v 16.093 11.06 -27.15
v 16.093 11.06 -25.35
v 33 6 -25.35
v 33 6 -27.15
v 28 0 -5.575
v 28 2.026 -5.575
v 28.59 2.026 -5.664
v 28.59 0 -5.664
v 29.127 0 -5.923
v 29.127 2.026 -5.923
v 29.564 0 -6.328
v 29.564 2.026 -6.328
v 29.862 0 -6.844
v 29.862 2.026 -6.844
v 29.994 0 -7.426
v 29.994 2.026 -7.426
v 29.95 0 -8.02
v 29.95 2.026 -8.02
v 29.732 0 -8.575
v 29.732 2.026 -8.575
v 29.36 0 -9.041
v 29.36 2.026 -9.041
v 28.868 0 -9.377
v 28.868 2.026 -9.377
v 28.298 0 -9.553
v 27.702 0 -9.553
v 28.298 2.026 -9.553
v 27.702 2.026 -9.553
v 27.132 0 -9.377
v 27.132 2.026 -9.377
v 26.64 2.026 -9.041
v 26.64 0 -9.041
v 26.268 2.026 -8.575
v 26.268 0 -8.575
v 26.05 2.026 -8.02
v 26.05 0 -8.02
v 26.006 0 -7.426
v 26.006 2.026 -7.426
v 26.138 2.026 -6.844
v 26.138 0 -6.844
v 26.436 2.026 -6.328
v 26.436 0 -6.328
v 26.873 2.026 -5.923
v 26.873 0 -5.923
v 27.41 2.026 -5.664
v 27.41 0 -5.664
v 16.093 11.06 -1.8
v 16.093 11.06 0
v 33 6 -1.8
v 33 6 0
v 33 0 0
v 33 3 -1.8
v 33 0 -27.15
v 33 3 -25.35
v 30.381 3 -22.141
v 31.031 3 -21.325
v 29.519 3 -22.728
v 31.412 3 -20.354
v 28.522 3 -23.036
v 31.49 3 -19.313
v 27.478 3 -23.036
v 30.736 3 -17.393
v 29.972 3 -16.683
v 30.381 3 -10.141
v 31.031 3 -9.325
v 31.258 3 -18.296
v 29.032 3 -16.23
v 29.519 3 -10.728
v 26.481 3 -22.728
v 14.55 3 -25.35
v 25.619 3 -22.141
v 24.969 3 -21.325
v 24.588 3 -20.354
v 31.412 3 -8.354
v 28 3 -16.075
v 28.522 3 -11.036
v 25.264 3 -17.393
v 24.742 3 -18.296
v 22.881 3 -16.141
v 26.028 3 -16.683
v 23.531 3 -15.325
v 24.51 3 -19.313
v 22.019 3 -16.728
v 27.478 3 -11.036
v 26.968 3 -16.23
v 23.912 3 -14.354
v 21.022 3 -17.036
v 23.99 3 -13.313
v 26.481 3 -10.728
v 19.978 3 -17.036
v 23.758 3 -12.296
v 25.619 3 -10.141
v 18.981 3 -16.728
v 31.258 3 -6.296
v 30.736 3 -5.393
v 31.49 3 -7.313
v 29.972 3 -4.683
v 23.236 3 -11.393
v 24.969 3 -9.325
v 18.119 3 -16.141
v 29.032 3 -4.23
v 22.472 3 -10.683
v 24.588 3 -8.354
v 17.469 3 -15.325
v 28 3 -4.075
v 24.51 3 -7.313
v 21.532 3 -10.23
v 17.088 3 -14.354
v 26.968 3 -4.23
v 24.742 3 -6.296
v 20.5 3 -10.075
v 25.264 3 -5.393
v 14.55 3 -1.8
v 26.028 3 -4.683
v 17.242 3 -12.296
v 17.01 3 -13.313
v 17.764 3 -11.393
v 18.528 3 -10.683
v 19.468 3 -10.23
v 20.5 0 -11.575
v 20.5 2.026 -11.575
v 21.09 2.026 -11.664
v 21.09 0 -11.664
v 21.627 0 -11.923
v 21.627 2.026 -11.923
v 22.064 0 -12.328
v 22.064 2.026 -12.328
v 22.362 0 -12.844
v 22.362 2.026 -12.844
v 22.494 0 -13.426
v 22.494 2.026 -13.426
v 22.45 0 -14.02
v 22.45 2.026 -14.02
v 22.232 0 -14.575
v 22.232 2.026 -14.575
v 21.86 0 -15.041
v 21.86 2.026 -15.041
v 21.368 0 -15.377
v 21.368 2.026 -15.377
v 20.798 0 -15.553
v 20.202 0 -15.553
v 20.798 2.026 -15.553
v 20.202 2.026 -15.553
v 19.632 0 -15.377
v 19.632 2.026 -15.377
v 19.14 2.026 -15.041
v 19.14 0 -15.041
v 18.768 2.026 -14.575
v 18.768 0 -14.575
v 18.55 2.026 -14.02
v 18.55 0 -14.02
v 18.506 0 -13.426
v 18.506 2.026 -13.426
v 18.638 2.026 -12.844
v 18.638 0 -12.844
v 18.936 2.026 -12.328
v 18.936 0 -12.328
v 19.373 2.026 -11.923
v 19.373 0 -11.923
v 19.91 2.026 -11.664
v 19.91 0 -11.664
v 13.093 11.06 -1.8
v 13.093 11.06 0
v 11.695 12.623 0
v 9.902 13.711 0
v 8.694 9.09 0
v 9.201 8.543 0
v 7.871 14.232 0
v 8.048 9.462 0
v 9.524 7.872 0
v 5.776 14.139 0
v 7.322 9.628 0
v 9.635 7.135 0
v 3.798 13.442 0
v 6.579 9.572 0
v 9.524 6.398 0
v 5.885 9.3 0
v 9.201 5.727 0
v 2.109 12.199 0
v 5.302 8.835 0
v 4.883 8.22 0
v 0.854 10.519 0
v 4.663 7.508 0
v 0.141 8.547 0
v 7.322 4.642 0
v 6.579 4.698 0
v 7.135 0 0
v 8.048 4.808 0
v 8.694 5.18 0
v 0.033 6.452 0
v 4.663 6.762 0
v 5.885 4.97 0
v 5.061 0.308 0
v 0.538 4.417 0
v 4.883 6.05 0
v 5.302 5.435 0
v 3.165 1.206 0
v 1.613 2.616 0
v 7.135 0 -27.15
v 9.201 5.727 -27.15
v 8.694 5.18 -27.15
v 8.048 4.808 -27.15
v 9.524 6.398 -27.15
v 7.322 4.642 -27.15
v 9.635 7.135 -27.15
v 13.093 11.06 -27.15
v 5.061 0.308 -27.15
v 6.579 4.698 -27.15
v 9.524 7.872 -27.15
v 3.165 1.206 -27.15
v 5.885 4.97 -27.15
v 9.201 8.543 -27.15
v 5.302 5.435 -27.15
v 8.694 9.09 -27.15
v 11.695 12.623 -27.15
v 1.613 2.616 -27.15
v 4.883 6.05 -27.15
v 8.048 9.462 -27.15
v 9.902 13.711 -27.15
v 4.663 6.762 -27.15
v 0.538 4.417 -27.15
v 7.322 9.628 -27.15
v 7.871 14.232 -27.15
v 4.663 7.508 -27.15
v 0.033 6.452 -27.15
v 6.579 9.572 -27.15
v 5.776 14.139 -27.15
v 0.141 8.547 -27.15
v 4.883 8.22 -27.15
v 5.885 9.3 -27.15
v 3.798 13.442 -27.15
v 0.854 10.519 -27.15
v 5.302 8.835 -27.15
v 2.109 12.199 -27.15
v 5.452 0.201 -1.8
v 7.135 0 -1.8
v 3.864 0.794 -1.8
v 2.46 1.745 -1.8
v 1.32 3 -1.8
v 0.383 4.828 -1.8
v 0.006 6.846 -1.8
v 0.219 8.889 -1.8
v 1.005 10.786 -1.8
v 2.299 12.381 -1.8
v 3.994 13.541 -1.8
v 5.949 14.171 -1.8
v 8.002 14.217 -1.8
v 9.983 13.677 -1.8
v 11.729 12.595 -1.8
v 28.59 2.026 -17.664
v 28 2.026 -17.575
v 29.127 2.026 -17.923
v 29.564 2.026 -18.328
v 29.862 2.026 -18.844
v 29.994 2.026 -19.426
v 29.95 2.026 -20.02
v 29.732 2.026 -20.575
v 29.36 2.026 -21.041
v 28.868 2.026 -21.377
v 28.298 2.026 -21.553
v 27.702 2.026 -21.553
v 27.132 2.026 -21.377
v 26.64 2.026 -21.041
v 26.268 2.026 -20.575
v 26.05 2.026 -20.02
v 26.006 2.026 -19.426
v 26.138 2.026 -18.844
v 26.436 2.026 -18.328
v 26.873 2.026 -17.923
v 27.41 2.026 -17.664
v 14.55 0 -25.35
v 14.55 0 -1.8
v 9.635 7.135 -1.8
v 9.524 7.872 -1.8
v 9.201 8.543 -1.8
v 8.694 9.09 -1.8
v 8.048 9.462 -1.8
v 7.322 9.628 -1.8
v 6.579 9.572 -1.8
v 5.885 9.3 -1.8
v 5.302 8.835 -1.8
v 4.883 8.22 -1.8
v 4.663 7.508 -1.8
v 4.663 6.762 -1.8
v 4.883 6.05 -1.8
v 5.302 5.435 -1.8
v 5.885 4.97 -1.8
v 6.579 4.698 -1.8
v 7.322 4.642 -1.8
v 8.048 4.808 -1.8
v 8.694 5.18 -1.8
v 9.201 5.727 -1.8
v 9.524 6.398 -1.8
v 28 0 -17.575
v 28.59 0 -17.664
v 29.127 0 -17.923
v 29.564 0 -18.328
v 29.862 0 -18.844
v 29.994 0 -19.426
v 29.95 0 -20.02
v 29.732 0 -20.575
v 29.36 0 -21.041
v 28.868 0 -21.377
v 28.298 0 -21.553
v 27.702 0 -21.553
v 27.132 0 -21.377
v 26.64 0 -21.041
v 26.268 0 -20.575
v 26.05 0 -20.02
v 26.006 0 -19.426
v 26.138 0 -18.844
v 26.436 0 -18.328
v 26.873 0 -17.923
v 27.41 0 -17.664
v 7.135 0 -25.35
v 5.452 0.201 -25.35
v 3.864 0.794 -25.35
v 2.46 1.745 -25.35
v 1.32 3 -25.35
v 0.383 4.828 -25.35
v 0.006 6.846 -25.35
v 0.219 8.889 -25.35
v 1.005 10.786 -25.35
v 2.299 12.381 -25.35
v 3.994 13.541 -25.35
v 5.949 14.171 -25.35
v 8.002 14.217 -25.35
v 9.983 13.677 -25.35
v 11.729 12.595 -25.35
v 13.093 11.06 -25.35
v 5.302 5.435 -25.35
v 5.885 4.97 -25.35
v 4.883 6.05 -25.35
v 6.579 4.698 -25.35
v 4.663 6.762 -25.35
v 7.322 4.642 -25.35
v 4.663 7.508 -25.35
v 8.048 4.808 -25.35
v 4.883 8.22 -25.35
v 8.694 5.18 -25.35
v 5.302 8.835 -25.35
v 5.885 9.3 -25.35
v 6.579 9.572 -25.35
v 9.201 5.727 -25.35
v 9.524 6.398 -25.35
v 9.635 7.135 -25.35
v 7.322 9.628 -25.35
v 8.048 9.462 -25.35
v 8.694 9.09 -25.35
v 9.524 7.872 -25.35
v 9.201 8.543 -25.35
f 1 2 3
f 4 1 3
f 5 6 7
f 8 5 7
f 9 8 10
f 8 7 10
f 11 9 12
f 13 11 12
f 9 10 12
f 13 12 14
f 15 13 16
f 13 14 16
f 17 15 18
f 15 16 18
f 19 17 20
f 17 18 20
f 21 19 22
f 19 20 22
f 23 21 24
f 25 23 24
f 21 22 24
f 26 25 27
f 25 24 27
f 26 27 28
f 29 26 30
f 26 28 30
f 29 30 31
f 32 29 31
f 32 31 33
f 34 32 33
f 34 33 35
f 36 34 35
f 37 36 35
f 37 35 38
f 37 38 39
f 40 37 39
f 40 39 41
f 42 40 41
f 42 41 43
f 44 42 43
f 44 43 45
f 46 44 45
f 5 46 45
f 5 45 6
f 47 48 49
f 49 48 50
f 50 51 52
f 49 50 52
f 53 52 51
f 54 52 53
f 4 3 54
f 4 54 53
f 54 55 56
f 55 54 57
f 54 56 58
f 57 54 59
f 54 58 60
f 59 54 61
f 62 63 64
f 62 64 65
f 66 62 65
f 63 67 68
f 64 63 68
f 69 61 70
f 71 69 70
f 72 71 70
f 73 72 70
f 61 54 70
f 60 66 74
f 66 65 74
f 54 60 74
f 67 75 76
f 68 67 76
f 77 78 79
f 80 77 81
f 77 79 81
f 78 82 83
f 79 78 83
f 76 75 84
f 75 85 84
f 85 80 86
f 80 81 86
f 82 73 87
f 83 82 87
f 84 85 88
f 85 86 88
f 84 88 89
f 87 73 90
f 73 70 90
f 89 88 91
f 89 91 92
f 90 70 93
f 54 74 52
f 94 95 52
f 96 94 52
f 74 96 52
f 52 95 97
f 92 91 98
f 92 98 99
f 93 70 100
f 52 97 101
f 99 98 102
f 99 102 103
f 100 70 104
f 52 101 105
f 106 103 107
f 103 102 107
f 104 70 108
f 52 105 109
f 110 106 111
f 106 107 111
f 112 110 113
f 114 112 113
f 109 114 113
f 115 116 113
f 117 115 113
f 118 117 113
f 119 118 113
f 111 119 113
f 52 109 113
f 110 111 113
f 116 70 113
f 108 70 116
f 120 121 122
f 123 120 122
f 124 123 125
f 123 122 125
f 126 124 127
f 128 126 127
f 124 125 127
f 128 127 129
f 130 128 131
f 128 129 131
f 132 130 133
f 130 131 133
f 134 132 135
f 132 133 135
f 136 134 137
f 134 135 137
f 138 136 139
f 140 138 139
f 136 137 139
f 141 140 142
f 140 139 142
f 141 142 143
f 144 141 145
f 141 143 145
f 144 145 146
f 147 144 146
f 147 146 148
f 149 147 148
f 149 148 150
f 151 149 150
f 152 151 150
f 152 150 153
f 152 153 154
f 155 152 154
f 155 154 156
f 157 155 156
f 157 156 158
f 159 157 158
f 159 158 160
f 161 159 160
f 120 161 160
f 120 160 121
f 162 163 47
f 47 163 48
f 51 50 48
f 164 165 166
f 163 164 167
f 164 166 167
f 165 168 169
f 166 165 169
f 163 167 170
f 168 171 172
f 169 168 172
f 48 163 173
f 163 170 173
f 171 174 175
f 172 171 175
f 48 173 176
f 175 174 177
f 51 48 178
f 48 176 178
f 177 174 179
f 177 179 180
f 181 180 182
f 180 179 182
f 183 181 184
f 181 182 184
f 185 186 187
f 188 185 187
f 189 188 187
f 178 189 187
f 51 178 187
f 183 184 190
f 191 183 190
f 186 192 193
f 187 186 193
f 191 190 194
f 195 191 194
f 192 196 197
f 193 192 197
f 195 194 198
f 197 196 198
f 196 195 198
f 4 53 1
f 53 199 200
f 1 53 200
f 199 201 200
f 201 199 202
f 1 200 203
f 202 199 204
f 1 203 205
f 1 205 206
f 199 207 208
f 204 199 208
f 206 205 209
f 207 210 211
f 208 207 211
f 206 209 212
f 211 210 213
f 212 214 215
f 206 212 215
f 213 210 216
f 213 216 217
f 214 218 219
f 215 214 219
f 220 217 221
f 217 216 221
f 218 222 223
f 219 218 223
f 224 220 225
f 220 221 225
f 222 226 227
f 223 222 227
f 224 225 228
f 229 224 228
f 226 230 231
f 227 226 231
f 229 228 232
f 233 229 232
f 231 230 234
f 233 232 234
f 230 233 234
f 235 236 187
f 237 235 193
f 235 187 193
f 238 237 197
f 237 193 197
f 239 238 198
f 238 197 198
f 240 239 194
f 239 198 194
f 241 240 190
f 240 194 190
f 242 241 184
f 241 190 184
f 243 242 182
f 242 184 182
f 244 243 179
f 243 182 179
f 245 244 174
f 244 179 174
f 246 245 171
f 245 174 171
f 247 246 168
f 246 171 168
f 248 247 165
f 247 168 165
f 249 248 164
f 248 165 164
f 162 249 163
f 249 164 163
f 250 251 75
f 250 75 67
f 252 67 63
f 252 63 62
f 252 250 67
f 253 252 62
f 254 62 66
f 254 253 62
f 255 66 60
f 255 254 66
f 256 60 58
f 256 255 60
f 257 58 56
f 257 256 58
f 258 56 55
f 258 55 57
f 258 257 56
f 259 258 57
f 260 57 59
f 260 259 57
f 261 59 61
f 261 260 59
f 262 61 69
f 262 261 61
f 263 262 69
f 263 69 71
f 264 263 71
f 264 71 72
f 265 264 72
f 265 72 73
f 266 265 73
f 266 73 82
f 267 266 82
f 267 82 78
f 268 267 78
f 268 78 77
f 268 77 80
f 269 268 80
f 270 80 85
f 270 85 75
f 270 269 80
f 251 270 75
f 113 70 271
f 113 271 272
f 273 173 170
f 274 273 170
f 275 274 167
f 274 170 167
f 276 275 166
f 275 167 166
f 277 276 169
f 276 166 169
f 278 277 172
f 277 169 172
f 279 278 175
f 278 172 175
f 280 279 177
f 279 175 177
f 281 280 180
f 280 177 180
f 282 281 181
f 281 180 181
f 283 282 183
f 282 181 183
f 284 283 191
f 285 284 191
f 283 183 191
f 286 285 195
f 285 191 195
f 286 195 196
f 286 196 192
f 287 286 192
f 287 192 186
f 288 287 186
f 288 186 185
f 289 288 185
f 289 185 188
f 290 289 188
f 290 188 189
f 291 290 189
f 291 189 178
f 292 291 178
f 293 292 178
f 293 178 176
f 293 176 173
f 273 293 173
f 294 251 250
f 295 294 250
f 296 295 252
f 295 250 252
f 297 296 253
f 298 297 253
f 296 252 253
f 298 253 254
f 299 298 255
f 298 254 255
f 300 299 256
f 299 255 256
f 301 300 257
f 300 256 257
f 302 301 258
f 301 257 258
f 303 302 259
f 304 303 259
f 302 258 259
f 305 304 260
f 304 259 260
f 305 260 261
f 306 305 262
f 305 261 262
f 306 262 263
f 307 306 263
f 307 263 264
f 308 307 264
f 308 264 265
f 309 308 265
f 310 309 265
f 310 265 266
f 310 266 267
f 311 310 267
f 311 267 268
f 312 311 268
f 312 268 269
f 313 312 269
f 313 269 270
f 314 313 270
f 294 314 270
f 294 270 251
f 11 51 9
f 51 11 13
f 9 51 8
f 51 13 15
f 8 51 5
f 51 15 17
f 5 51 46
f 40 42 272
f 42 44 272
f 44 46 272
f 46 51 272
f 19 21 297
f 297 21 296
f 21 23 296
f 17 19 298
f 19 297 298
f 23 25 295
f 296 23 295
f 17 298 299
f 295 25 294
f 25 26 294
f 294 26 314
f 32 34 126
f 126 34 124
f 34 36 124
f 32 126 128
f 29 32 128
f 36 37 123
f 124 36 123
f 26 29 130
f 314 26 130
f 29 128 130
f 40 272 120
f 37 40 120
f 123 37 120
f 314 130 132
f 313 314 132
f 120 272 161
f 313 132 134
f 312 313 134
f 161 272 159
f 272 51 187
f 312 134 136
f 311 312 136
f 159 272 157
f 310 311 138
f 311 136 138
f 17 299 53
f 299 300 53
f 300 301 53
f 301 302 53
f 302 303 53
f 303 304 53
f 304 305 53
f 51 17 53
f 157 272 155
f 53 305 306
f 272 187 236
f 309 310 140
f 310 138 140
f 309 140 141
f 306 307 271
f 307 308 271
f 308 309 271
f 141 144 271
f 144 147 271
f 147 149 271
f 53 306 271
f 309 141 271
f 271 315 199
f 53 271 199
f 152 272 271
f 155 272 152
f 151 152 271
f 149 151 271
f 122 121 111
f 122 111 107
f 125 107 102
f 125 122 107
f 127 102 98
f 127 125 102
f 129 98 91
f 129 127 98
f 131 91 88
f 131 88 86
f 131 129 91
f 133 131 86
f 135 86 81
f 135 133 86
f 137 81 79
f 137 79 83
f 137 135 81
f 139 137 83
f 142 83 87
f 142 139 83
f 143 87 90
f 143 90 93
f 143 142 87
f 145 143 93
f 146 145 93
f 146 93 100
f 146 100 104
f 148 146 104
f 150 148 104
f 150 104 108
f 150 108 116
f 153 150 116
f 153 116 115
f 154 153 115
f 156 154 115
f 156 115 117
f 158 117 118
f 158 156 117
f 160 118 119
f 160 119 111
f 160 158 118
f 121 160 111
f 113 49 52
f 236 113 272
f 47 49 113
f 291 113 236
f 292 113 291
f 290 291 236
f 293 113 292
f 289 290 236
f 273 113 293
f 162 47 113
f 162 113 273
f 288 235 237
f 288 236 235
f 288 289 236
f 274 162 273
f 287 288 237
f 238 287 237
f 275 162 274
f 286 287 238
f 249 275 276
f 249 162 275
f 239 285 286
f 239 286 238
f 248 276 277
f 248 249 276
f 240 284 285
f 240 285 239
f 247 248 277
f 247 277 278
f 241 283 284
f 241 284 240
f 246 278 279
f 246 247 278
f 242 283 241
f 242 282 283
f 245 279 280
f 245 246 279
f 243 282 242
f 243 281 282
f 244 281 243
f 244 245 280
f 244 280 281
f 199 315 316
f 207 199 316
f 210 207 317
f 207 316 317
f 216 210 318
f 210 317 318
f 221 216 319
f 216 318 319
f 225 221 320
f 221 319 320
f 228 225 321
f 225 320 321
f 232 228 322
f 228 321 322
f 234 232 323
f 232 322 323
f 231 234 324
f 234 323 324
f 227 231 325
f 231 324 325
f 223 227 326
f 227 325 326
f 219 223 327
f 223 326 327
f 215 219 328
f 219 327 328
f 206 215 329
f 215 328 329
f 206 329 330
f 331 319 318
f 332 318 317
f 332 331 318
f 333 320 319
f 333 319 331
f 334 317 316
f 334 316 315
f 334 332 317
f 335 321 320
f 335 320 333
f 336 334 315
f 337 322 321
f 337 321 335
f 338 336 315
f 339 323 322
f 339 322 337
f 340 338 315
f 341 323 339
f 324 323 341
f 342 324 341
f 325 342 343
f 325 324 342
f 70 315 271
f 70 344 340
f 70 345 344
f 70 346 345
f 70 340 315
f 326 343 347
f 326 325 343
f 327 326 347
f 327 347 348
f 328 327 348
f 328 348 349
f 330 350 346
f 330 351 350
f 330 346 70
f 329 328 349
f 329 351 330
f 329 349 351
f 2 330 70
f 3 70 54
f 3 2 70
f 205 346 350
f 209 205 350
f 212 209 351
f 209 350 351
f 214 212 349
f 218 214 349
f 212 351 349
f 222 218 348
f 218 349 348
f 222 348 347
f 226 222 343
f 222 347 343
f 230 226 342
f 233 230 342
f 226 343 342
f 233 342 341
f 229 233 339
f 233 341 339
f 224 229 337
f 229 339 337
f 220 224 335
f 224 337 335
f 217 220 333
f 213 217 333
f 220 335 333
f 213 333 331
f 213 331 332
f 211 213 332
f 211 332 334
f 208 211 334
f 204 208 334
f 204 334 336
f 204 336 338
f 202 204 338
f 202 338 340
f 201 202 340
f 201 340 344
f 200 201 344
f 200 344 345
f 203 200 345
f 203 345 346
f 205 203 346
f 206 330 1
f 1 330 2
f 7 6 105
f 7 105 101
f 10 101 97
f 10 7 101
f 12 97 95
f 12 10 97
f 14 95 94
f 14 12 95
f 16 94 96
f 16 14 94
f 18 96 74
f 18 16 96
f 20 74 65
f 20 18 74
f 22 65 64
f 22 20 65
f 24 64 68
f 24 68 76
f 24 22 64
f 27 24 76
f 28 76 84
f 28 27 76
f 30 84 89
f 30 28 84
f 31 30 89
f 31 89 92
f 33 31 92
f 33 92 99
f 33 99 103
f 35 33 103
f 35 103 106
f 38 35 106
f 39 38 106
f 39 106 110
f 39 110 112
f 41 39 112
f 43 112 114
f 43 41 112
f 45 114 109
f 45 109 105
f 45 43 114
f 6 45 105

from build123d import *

# Parameters (mm, degrees)
PROFILEBOSS_EXTRUDE1_DEPTH                  = 33
SKETCH2_OUTSIDE_W                           = 44.01
SKETCH2_OUTSIDE_H                           = 25.28
SKETCH2_OUTSIDE_R                           = 2.5
SIDEPROFILECUT_EXTRUDE1_DEPTH               = 46.052806794
BOTTOMCUT_EXTRUDE2_DEPTH                    = 45.194291487
DRAGLINKMOUNTHOLESSKETCH4_R                 = 2
DRAGLINKMOUNTHOLESCUT_EXTRUDE3_DEPTH        = 45.194291487
CHAMFER1_SIZE                               = 1.5
CHAMFER1_SIZE2                              = 0.97411139
SKETCH4_W                                   = 4.5
SKETCH4_H                                   = 17.25
DISABLESWIIVELRESTRICTIONCUT_EXTRUDE4_DEPTH = 45.194291487


with BuildPart() as part:
    # Sketch1 → ProfileBoss-Extrude1 (new body)
    with BuildSketch(Plane(origin=(0, 0, 0), x_dir=(0, 0, -1), z_dir=(1, 0, 0))):
        Polygon((0, 14.27), (0, 0), (27.15, 0), (27.15, 14.27), (25.35, 14.27), (25.35, 3), (1.8, 3), (1.8, 14.27), align=None)
    extrude(amount=PROFILEBOSS_EXTRUDE1_DEPTH)

    # Sketch2 outside → SideProfileCut-Extrude1 (cut, through all)
    # profile 1 of 2: a face of its own
    with BuildSketch(Plane.XY):
        with Locations((16.5, 7.135)):
            Rectangle(SKETCH2_OUTSIDE_W, SKETCH2_OUTSIDE_H)
        with BuildLine():
            Line((13.093405827, 11.06), (16.093405827, 11.06))
            Line((16.093405827, 11.06), (33, 6))
            Line((33, 6), (33, 0))
            Line((33, 0), (7.135, 0))
            ThreePointArc((7.135, 0), (0.853555103, 10.519032358), (13.093405827, 11.06))
        make_face(mode=Mode.SUBTRACT)
    # profile 2 of 2: a face of its own
    with BuildSketch(Plane.XY):
        with Locations((7.135, 7.135)):
            Circle(SKETCH2_OUTSIDE_R)
    extrude(amount=-SIDEPROFILECUT_EXTRUDE1_DEPTH, mode=Mode.SUBTRACT)

    # Sketch3 → BottomCut-Extrude2 (cut, through all)
    with BuildSketch(Plane(origin=(0, 3, 0), x_dir=(1, 0, 0), z_dir=(0, 1, 0))):
        Polygon((1.320363296, 25.35), (14.55, 25.35), (14.55, 22.2), (10.05, 22.2), (10.05, 4.95), (14.55, 4.95), (14.55, 1.8), (1.320363296, 1.8), align=None)
    extrude(amount=-BOTTOMCUT_EXTRUDE2_DEPTH, mode=Mode.SUBTRACT)

    # DragLinkMountHolesSketch4 → DragLinkMountHolesCut-Extrude3 (cut, through all)
    with BuildSketch(Plane(origin=(0, 3, 0), x_dir=(1, 0, 0), z_dir=(0, 1, 0))):
        with Locations(Location((28, 19.575, 0), (0, 0, 270))):
            Circle(DRAGLINKMOUNTHOLESSKETCH4_R)
        with Locations(Location((28, 7.575, 0), (0, 0, 270))):
            Circle(DRAGLINKMOUNTHOLESSKETCH4_R)
        with Locations(Location((20.5, 13.575, 0), (0, 0, 270))):
            Circle(DRAGLINKMOUNTHOLESSKETCH4_R)
    extrude(amount=-DRAGLINKMOUNTHOLESCUT_EXTRUDE3_DEPTH, mode=Mode.SUBTRACT)

    # Chamfer1
    chamfer1_edges = [part.edges().sort_by_distance(p)[0] for p in [
        (28, 3, -21.575),
        (28, 3, -9.575),
        (20.5, 3, -15.575),
    ]]
    chamfer1_side = [part.faces().sort_by_distance(p)[0] for p in [
        (14.878832024, 3, -23.775),
    ]]
    chamfer(chamfer1_edges, length=CHAMFER1_SIZE, length2=CHAMFER1_SIZE2, reference=chamfer1_side[0])

    # Sketch4 → DisableSwiivelRestrictionCut-Extrude4 (cut, through all)
    with BuildSketch(Plane(origin=(0, 3, 0), x_dir=(1, 0, 0), z_dir=(0, 1, 0))):
        with Locations((12.3, 13.575)):
            Rectangle(SKETCH4_W, SKETCH4_H)
    extrude(amount=-DISABLESWIIVELRESTRICTIONCUT_EXTRUDE4_DEPTH, mode=Mode.SUBTRACT)


solid = part.part
